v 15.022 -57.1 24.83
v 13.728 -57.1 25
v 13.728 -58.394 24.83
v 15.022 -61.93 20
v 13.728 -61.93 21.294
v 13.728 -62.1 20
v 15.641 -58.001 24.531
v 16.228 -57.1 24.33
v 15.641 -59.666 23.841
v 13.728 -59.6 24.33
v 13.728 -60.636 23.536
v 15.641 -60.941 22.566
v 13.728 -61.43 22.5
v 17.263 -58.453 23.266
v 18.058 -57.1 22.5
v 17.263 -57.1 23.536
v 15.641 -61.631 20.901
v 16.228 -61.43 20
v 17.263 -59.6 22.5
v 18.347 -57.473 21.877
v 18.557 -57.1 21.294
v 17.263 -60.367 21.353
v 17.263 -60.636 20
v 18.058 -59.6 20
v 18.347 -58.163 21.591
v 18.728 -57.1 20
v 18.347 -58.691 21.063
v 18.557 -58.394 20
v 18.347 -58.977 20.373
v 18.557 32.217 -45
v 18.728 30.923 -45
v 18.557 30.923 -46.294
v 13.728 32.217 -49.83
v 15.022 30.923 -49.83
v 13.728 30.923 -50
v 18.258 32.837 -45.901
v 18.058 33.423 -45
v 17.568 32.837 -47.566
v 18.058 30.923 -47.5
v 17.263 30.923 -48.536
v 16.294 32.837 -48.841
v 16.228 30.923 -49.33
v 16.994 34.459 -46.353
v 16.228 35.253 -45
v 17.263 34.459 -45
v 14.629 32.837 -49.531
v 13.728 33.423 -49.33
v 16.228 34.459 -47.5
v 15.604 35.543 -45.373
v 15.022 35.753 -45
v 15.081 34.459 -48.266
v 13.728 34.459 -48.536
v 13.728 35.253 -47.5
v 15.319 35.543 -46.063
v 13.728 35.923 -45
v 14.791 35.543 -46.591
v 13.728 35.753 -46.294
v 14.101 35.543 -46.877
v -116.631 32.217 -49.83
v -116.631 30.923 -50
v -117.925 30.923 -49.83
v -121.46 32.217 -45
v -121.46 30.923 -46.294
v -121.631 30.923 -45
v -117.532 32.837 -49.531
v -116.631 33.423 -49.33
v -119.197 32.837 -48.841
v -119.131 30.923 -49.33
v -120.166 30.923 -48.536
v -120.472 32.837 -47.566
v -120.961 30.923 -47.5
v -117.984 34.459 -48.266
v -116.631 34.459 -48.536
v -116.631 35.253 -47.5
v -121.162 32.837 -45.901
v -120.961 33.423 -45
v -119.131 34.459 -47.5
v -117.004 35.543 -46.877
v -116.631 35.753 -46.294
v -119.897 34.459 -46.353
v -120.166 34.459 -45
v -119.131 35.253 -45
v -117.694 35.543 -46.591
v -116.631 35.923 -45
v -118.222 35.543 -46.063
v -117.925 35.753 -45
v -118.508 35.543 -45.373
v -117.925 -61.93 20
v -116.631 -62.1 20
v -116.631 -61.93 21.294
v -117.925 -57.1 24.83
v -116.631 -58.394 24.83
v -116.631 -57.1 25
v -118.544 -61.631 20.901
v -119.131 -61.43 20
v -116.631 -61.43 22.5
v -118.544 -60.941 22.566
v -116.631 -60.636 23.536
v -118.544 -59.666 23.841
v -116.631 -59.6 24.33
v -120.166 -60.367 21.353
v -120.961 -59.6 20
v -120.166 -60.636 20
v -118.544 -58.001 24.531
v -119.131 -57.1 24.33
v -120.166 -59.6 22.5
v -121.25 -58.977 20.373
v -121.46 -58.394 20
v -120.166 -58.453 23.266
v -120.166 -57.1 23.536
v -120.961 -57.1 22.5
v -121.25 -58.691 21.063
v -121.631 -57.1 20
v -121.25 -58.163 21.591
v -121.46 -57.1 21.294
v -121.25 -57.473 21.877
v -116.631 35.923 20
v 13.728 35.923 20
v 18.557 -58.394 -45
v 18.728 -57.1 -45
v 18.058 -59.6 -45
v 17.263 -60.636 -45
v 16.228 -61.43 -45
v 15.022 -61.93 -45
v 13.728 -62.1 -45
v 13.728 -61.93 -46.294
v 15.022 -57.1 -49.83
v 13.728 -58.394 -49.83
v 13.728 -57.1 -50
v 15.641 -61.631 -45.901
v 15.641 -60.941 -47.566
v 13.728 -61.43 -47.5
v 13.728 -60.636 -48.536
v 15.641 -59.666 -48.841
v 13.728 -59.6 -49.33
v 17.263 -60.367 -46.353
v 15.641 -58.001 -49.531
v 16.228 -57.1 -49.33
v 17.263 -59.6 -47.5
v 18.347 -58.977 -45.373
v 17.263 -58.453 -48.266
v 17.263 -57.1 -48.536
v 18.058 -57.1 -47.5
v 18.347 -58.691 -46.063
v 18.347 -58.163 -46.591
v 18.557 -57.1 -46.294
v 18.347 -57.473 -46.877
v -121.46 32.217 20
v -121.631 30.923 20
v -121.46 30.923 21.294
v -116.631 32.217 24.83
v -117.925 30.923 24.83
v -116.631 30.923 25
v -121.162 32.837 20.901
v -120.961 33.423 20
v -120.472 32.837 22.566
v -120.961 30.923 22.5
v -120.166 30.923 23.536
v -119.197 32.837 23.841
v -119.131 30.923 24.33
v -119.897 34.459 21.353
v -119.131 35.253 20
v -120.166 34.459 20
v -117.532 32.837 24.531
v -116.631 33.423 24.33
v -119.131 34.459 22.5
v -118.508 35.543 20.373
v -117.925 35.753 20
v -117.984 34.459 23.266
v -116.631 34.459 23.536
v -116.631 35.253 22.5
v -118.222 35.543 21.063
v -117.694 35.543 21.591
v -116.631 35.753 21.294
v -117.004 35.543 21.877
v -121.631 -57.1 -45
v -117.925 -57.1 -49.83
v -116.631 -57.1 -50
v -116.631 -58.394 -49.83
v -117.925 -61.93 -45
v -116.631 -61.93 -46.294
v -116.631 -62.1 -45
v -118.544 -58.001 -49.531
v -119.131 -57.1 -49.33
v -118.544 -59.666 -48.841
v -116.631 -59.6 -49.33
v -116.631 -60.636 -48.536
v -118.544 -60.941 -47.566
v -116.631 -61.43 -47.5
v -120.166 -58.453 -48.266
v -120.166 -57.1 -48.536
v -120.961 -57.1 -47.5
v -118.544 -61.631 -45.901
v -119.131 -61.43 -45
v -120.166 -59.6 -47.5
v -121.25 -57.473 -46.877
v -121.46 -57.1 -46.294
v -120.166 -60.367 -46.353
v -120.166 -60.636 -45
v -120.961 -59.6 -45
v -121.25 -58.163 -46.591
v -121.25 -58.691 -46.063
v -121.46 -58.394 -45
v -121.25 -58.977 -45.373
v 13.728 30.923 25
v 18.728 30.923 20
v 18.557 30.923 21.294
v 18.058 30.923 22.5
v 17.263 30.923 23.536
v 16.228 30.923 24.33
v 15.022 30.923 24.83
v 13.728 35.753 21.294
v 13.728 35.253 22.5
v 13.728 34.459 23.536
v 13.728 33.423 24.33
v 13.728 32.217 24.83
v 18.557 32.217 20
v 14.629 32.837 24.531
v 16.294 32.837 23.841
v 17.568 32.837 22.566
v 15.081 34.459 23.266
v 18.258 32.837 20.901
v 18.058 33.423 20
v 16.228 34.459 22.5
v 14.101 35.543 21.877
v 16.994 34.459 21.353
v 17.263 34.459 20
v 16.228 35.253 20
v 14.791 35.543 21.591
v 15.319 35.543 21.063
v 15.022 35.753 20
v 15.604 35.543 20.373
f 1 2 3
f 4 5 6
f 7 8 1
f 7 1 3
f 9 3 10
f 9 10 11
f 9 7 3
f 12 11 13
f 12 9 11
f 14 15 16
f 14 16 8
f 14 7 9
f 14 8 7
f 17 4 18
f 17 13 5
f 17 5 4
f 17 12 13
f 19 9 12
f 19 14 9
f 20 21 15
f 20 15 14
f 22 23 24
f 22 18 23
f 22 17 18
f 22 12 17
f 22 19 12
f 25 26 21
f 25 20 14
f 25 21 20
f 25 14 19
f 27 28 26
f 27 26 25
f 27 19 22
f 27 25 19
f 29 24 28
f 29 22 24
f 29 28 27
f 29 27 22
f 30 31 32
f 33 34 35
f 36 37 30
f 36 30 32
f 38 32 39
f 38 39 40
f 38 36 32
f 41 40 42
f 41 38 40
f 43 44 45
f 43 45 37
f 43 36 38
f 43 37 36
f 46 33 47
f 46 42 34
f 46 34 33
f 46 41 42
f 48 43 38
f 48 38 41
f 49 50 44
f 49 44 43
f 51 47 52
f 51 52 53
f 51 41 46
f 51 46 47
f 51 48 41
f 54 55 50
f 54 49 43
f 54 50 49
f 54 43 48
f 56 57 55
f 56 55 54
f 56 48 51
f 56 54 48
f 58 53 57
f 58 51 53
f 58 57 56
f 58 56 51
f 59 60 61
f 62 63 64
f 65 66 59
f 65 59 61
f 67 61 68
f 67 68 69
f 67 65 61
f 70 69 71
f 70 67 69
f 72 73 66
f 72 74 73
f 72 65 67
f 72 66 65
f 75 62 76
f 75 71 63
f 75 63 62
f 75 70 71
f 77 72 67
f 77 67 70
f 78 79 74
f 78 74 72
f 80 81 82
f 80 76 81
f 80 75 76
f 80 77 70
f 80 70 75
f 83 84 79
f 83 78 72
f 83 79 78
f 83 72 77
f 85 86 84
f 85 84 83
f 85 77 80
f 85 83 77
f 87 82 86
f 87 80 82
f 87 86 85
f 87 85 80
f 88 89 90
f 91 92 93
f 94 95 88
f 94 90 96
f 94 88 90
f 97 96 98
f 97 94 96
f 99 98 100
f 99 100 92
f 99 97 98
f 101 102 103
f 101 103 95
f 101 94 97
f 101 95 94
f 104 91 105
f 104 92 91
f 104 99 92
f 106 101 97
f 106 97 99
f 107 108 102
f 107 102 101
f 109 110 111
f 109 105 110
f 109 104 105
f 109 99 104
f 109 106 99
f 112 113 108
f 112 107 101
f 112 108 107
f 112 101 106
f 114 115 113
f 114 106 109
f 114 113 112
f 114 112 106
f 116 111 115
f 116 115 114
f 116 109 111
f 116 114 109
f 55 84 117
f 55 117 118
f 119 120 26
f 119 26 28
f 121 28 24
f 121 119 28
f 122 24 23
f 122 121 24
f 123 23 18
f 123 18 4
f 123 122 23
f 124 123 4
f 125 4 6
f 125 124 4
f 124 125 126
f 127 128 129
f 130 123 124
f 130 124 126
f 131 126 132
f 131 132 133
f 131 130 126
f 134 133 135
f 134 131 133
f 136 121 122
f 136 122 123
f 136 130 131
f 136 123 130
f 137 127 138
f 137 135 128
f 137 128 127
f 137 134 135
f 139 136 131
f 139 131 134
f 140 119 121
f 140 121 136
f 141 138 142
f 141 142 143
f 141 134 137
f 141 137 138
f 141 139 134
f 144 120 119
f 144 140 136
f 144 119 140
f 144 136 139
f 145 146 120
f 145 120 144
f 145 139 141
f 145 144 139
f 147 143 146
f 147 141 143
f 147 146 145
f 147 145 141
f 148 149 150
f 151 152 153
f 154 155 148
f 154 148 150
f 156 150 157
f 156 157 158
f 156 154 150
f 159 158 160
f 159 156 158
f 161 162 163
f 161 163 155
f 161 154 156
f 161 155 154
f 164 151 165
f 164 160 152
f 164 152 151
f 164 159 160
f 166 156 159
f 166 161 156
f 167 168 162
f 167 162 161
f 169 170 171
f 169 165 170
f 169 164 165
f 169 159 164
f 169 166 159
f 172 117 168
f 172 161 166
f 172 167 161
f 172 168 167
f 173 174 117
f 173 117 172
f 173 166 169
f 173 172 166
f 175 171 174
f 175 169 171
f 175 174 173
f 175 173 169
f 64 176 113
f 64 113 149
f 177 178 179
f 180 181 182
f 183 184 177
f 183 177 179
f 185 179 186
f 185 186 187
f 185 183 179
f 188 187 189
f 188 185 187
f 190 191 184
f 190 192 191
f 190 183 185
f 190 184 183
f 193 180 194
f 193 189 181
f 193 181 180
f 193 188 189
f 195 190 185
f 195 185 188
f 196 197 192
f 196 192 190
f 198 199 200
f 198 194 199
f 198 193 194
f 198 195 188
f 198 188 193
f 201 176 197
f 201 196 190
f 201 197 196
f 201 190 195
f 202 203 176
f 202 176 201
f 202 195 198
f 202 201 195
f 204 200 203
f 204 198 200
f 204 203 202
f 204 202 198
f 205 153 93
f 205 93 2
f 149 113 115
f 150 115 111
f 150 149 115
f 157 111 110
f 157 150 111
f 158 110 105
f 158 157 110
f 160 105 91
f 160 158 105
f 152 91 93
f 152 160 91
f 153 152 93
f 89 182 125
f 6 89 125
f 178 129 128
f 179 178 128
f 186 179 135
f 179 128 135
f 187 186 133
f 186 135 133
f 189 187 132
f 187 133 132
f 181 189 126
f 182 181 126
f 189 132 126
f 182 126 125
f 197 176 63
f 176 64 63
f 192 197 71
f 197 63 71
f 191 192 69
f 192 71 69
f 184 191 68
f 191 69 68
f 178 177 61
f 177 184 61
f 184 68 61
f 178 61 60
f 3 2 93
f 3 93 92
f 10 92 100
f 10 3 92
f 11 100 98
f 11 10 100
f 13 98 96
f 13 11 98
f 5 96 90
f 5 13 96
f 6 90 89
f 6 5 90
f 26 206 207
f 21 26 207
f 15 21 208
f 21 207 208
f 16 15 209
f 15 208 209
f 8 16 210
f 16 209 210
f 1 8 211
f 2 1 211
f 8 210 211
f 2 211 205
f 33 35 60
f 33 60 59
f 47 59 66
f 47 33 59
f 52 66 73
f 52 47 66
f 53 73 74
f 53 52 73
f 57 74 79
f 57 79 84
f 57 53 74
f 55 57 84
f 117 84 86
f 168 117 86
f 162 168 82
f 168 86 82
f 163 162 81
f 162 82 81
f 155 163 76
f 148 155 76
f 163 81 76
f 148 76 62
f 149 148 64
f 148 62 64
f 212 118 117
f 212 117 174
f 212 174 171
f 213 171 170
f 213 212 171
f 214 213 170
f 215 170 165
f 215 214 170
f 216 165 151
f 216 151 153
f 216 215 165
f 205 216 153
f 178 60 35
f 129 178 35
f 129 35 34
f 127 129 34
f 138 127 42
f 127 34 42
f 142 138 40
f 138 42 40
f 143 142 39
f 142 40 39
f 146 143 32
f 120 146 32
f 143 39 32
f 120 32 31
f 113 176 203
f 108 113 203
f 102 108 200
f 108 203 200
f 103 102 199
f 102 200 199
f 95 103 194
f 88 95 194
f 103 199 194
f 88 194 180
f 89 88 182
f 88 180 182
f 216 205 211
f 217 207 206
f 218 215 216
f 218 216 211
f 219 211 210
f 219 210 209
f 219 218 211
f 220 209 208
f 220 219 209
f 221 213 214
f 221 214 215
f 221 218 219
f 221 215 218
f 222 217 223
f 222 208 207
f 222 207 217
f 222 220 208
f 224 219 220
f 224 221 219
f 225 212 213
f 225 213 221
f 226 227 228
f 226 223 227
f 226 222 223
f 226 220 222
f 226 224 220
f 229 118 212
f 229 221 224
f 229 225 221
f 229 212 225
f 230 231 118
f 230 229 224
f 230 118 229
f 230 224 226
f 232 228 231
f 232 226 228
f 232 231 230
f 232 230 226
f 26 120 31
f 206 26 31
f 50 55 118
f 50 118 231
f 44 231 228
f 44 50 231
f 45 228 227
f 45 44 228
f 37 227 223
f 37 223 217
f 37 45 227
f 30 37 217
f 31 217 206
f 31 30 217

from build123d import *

# Parameters (mm, degrees)
F0_W         = 140.3584312648
F0_H         = 98.0234518647
F1_DEPTH     = 25
F2_DEPTH     = 50
F3_DEPTH     = 25
F4_R         = 5
F5_T1_DEPTH  = 65
F5_S5_W      = 5
F5_S5_H      = 5
F5_T6_DEPTH  = 5
F5_S11_W     = 5
F5_S11_H     = 5
F5_T12_DEPTH = 5
F5_S17_W     = 5
F5_S17_H     = 5
F5_T18_DEPTH = 5
F5_S23_W     = 5
F5_S23_H     = 5
F5_T24_DEPTH = 5
F5_S29_W     = 5
F5_S29_H     = 5
F5_T30_DEPTH = 5
F5_S35_W     = 5
F5_S35_H     = 5
F5_T36_DEPTH = 5
F5_S41_W     = 5
F5_S41_H     = 5
F5_T42_DEPTH = 5
F5_S47_W     = 5
F5_S47_H     = 5
F5_T48_DEPTH = 5


# Not quite as in the source:
# - a fillet or chamfer that OpenCascade refuses, or shapes differently, is made with other operations: its cross-section is extruded or revolved along the edge and cut away or added


with BuildPart() as f1:
    # F0 (on Top) → F1 (new body)
    with BuildSketch(Plane.XY):
        with Locations((-51.4516541734, -13.0883678794)):
            Rectangle(F0_W, F0_H)
    extrude(amount=F1_DEPTH)

    # F2 (add): a face of the model
    f2_faces = [f1.faces().sort_by_distance(p)[0] for p in [
        (-51.4516541734, -13.0883678794, 0),
    ]]
    extrude(f2_faces, amount=F2_DEPTH)

    # F3 (add): a face of the model
    f3_faces = [f1.faces().sort_by_distance(p)[0] for p in [
        (-51.4516541734, -13.0883678794, -50),
    ]]
    extrude(f3_faces, amount=-F3_DEPTH)

    # F4
    f4_edges = [f1.edges().sort_by_distance(p)[0] for p in [
        (18.727561, -13.088368, 25),
        (-121.63087, -13.088368, 25),
        (-51.451654, 35.923358, 25),
        (-51.451654, -62.100094, 25),
        (-51.451654, 35.923358, -50),
        (-121.63087, -13.088368, -50),
        (-51.451654, -62.100094, -50),
        (18.727561, -13.088368, -50),
    ]]
    fillet(f4_edges, radius=F4_R)

    # F5: fillet of radius 5 on 4 edges, made by hand

    # F5_s2 → F5_t1 (cut)
    with BuildSketch(Plane.XY.offset(-45)):
        with BuildLine():
            ThreePointArc((-116.6308698058, 35.923358053), (-120.1664037117, 34.4588919589), (-121.6308698058, 30.923358053))
            Line((-121.6308698058, 30.923358053), (-121.6308698058, 35.923358053))
            Line((-121.6308698058, 35.923358053), (-116.6308698058, 35.923358053))
        make_face()
        with BuildLine():
            ThreePointArc((13.7275614589, 35.923358053), (17.2630953649, 34.4588919589), (18.7275614589, 30.923358053))
            Line((18.7275614589, 30.923358053), (18.7275614589, 35.923358053))
            Line((18.7275614589, 35.923358053), (13.7275614589, 35.923358053))
        make_face()
        with BuildLine():
            ThreePointArc((18.7275614589, -57.1000938118), (17.2630953649, -60.6356277177), (13.7275614589, -62.1000938118))
            Line((13.7275614589, -62.1000938118), (18.7275614589, -62.1000938118))
            Line((18.7275614589, -62.1000938118), (18.7275614589, -57.1000938118))
        make_face()
        with BuildLine():
            ThreePointArc((-121.6308698058, -57.1000938118), (-120.1664037117, -60.6356277177), (-116.6308698058, -62.1000938118))
            Line((-116.6308698058, -62.1000938118), (-121.6308698058, -62.1000938118))
            Line((-121.6308698058, -62.1000938118), (-121.6308698058, -57.1000938118))
        make_face()
    extrude(amount=F5_T1_DEPTH, mode=Mode.SUBTRACT)


with BuildPart() as f5_tool4:
    # F5_s5 → F5_t6 (new body)
    with BuildSketch(Plane.YZ.offset(-116.6308698058)):
        with Locations((-59.6000938118, -47.5)):
            Rectangle(F5_S5_W, F5_S5_H)
    extrude(amount=-F5_T6_DEPTH)

    # F5_s7 → F5_t8 (revolve, cut)
    with BuildSketch(Plane(origin=(-116.6308698058, -57.1000938118, -45), x_dir=(0, 0.7071067812, 0.7071067812), z_dir=(0, -0.7071067812, 0.7071067812))):
        with BuildLine():
            ThreePointArc((0, -5), (5, 0), (0, 5))
            Line((0, 5), (0, -5))
        make_face()
    revolve(axis=Axis((-116.6308698058, -57.1000938118, -45), (-1, 0, 0)), mode=Mode.SUBTRACT)


with BuildPart() as f1_1:
    add(f1.part)

    # F5_t3: cut F5_tool4
    add(f5_tool4.part, mode=Mode.SUBTRACT)


with BuildPart() as f5_tool10:
    # F5_s11 → F5_t12 (new body)
    with BuildSketch(Plane.YZ.offset(-116.6308698058)):
        with Locations((-59.6000938118, 22.5)):
            Rectangle(F5_S11_W, F5_S11_H)
    extrude(amount=-F5_T12_DEPTH)

    # F5_s13 → F5_t14 (revolve, cut)
    with BuildSketch(Plane(origin=(-116.6308698058, -57.1000938118, 20), x_dir=(0, 0.7071067812, -0.7071067812), z_dir=(0, 0.7071067812, 0.7071067812))):
        with BuildLine():
            ThreePointArc((0, -5), (5, 0), (0, 5))
            Line((0, 5), (0, -5))
        make_face()
    revolve(axis=Axis((-116.6308698058, -57.1000938118, 20), (-1, 0, 0)), mode=Mode.SUBTRACT)


with BuildPart() as f1_2:
    add(f1_1.part)

    # F5_t9: cut F5_tool10
    add(f5_tool10.part, mode=Mode.SUBTRACT)


with BuildPart() as f5_tool16:
    # F5_s17 → F5_t18 (new body)
    with BuildSketch(Plane.YZ.offset(13.7275614589)):
        with Locations((-59.6000938118, 22.5)):
            Rectangle(F5_S17_W, F5_S17_H)
    extrude(amount=F5_T18_DEPTH)

    # F5_s19 → F5_t20 (revolve, cut)
    with BuildSketch(Plane(origin=(13.7275614589, -57.1000938118, 20), x_dir=(0, 0.7071067812, -0.7071067812), z_dir=(0, -0.7071067812, -0.7071067812))):
        with BuildLine():
            ThreePointArc((0, -5), (5, 0), (0, 5))
            Line((0, 5), (0, -5))
        make_face()
    revolve(axis=Axis((13.7275614589, -57.1000938118, 20), (1, 0, 0)), mode=Mode.SUBTRACT)


with BuildPart() as f1_3:
    add(f1_2.part)

    # F5_t15: cut F5_tool16
    add(f5_tool16.part, mode=Mode.SUBTRACT)


with BuildPart() as f5_tool22:
    # F5_s23 → F5_t24 (new body)
    with BuildSketch(Plane.YZ.offset(13.7275614589)):
        with Locations((-59.6000938118, -47.5)):
            Rectangle(F5_S23_W, F5_S23_H)
    extrude(amount=F5_T24_DEPTH)

    # F5_s25 → F5_t26 (revolve, cut)
    with BuildSketch(Plane(origin=(13.7275614589, -57.1000938118, -45), x_dir=(0, 0.7071067812, 0.7071067812), z_dir=(0, 0.7071067812, -0.7071067812))):
        with BuildLine():
            ThreePointArc((0, -5), (5, 0), (0, 5))
            Line((0, 5), (0, -5))
        make_face()
    revolve(axis=Axis((13.7275614589, -57.1000938118, -45), (1, 0, 0)), mode=Mode.SUBTRACT)


with BuildPart() as f1_4:
    add(f1_3.part)

    # F5_t21: cut F5_tool22
    add(f5_tool22.part, mode=Mode.SUBTRACT)


with BuildPart() as f5_tool28:
    # F5_s29 → F5_t30 (new body)
    with BuildSketch(Plane.XZ.offset(-30.923358053)):
        with Locations((16.2275614589, 22.5)):
            Rectangle(F5_S29_W, F5_S29_H)
    extrude(amount=-F5_T30_DEPTH)

    # F5_s31 → F5_t32 (revolve, cut)
    with BuildSketch(Plane(origin=(13.7275614589, 30.923358053, 20), x_dir=(-0.7071067812, 0, -0.7071067812), z_dir=(0.7071067812, 0, -0.7071067812))):
        with BuildLine():
            ThreePointArc((0, -5), (5, 0), (0, 5))
            Line((0, 5), (0, -5))
        make_face()
    revolve(axis=Axis((13.7275614589, 30.923358053, 20), (0, 1, 0)), mode=Mode.SUBTRACT)


with BuildPart() as f1_5:
    add(f1_4.part)

    # F5_t27: cut F5_tool28
    add(f5_tool28.part, mode=Mode.SUBTRACT)


with BuildPart() as f5_tool34:
    # F5_s35 → F5_t36 (new body)
    with BuildSketch(Plane.XZ.offset(-30.923358053)):
        with Locations((16.2275614589, -47.5)):
            Rectangle(F5_S35_W, F5_S35_H)
    extrude(amount=-F5_T36_DEPTH)

    # F5_s37 → F5_t38 (revolve, cut)
    with BuildSketch(Plane(origin=(13.7275614589, 30.923358053, -45), x_dir=(-0.7071067812, 0, 0.7071067812), z_dir=(-0.7071067812, 0, -0.7071067812))):
        with BuildLine():
            ThreePointArc((0, -5), (5, 0), (0, 5))
            Line((0, 5), (0, -5))
        make_face()
    revolve(axis=Axis((13.7275614589, 30.923358053, -45), (0, 1, 0)), mode=Mode.SUBTRACT)


with BuildPart() as f1_6:
    add(f1_5.part)

    # F5_t33: cut F5_tool34
    add(f5_tool34.part, mode=Mode.SUBTRACT)


with BuildPart() as f5_tool40:
    # F5_s41 → F5_t42 (new body)
    with BuildSketch(Plane.XZ.offset(-30.923358053)):
        with Locations((-119.1308698058, -47.5)):
            Rectangle(F5_S41_W, F5_S41_H)
    extrude(amount=-F5_T42_DEPTH)

    # F5_s43 → F5_t44 (revolve, cut)
    with BuildSketch(Plane(origin=(-116.6308698058, 30.923358053, -45), x_dir=(0.7071067812, 0, 0.7071067812), z_dir=(-0.7071067812, 0, 0.7071067812))):
        with BuildLine():
            ThreePointArc((0, -5), (5, 0), (0, 5))
            Line((0, 5), (0, -5))
        make_face()
    revolve(axis=Axis((-116.6308698058, 30.923358053, -45), (0, 1, 0)), mode=Mode.SUBTRACT)


with BuildPart() as f1_7:
    add(f1_6.part)

    # F5_t39: cut F5_tool40
    add(f5_tool40.part, mode=Mode.SUBTRACT)


with BuildPart() as f5_tool46:
    # F5_s47 → F5_t48 (new body)
    with BuildSketch(Plane.XZ.offset(-30.923358053)):
        with Locations((-119.1308698058, 22.5)):
            Rectangle(F5_S47_W, F5_S47_H)
    extrude(amount=-F5_T48_DEPTH)

    # F5_s49 → F5_t50 (revolve, cut)
    with BuildSketch(Plane(origin=(-116.6308698058, 30.923358053, 20), x_dir=(0.7071067812, 0, -0.7071067812), z_dir=(0.7071067812, 0, 0.7071067812))):
        with BuildLine():
            ThreePointArc((0, -5), (5, 0), (0, 5))
            Line((0, 5), (0, -5))
        make_face()
    revolve(axis=Axis((-116.6308698058, 30.923358053, 20), (0, 1, 0)), mode=Mode.SUBTRACT)


with BuildPart() as f1_8:
    add(f1_7.part)

    # F5_t45: cut F5_tool46
    add(f5_tool46.part, mode=Mode.SUBTRACT)


solid = f1_8.part
